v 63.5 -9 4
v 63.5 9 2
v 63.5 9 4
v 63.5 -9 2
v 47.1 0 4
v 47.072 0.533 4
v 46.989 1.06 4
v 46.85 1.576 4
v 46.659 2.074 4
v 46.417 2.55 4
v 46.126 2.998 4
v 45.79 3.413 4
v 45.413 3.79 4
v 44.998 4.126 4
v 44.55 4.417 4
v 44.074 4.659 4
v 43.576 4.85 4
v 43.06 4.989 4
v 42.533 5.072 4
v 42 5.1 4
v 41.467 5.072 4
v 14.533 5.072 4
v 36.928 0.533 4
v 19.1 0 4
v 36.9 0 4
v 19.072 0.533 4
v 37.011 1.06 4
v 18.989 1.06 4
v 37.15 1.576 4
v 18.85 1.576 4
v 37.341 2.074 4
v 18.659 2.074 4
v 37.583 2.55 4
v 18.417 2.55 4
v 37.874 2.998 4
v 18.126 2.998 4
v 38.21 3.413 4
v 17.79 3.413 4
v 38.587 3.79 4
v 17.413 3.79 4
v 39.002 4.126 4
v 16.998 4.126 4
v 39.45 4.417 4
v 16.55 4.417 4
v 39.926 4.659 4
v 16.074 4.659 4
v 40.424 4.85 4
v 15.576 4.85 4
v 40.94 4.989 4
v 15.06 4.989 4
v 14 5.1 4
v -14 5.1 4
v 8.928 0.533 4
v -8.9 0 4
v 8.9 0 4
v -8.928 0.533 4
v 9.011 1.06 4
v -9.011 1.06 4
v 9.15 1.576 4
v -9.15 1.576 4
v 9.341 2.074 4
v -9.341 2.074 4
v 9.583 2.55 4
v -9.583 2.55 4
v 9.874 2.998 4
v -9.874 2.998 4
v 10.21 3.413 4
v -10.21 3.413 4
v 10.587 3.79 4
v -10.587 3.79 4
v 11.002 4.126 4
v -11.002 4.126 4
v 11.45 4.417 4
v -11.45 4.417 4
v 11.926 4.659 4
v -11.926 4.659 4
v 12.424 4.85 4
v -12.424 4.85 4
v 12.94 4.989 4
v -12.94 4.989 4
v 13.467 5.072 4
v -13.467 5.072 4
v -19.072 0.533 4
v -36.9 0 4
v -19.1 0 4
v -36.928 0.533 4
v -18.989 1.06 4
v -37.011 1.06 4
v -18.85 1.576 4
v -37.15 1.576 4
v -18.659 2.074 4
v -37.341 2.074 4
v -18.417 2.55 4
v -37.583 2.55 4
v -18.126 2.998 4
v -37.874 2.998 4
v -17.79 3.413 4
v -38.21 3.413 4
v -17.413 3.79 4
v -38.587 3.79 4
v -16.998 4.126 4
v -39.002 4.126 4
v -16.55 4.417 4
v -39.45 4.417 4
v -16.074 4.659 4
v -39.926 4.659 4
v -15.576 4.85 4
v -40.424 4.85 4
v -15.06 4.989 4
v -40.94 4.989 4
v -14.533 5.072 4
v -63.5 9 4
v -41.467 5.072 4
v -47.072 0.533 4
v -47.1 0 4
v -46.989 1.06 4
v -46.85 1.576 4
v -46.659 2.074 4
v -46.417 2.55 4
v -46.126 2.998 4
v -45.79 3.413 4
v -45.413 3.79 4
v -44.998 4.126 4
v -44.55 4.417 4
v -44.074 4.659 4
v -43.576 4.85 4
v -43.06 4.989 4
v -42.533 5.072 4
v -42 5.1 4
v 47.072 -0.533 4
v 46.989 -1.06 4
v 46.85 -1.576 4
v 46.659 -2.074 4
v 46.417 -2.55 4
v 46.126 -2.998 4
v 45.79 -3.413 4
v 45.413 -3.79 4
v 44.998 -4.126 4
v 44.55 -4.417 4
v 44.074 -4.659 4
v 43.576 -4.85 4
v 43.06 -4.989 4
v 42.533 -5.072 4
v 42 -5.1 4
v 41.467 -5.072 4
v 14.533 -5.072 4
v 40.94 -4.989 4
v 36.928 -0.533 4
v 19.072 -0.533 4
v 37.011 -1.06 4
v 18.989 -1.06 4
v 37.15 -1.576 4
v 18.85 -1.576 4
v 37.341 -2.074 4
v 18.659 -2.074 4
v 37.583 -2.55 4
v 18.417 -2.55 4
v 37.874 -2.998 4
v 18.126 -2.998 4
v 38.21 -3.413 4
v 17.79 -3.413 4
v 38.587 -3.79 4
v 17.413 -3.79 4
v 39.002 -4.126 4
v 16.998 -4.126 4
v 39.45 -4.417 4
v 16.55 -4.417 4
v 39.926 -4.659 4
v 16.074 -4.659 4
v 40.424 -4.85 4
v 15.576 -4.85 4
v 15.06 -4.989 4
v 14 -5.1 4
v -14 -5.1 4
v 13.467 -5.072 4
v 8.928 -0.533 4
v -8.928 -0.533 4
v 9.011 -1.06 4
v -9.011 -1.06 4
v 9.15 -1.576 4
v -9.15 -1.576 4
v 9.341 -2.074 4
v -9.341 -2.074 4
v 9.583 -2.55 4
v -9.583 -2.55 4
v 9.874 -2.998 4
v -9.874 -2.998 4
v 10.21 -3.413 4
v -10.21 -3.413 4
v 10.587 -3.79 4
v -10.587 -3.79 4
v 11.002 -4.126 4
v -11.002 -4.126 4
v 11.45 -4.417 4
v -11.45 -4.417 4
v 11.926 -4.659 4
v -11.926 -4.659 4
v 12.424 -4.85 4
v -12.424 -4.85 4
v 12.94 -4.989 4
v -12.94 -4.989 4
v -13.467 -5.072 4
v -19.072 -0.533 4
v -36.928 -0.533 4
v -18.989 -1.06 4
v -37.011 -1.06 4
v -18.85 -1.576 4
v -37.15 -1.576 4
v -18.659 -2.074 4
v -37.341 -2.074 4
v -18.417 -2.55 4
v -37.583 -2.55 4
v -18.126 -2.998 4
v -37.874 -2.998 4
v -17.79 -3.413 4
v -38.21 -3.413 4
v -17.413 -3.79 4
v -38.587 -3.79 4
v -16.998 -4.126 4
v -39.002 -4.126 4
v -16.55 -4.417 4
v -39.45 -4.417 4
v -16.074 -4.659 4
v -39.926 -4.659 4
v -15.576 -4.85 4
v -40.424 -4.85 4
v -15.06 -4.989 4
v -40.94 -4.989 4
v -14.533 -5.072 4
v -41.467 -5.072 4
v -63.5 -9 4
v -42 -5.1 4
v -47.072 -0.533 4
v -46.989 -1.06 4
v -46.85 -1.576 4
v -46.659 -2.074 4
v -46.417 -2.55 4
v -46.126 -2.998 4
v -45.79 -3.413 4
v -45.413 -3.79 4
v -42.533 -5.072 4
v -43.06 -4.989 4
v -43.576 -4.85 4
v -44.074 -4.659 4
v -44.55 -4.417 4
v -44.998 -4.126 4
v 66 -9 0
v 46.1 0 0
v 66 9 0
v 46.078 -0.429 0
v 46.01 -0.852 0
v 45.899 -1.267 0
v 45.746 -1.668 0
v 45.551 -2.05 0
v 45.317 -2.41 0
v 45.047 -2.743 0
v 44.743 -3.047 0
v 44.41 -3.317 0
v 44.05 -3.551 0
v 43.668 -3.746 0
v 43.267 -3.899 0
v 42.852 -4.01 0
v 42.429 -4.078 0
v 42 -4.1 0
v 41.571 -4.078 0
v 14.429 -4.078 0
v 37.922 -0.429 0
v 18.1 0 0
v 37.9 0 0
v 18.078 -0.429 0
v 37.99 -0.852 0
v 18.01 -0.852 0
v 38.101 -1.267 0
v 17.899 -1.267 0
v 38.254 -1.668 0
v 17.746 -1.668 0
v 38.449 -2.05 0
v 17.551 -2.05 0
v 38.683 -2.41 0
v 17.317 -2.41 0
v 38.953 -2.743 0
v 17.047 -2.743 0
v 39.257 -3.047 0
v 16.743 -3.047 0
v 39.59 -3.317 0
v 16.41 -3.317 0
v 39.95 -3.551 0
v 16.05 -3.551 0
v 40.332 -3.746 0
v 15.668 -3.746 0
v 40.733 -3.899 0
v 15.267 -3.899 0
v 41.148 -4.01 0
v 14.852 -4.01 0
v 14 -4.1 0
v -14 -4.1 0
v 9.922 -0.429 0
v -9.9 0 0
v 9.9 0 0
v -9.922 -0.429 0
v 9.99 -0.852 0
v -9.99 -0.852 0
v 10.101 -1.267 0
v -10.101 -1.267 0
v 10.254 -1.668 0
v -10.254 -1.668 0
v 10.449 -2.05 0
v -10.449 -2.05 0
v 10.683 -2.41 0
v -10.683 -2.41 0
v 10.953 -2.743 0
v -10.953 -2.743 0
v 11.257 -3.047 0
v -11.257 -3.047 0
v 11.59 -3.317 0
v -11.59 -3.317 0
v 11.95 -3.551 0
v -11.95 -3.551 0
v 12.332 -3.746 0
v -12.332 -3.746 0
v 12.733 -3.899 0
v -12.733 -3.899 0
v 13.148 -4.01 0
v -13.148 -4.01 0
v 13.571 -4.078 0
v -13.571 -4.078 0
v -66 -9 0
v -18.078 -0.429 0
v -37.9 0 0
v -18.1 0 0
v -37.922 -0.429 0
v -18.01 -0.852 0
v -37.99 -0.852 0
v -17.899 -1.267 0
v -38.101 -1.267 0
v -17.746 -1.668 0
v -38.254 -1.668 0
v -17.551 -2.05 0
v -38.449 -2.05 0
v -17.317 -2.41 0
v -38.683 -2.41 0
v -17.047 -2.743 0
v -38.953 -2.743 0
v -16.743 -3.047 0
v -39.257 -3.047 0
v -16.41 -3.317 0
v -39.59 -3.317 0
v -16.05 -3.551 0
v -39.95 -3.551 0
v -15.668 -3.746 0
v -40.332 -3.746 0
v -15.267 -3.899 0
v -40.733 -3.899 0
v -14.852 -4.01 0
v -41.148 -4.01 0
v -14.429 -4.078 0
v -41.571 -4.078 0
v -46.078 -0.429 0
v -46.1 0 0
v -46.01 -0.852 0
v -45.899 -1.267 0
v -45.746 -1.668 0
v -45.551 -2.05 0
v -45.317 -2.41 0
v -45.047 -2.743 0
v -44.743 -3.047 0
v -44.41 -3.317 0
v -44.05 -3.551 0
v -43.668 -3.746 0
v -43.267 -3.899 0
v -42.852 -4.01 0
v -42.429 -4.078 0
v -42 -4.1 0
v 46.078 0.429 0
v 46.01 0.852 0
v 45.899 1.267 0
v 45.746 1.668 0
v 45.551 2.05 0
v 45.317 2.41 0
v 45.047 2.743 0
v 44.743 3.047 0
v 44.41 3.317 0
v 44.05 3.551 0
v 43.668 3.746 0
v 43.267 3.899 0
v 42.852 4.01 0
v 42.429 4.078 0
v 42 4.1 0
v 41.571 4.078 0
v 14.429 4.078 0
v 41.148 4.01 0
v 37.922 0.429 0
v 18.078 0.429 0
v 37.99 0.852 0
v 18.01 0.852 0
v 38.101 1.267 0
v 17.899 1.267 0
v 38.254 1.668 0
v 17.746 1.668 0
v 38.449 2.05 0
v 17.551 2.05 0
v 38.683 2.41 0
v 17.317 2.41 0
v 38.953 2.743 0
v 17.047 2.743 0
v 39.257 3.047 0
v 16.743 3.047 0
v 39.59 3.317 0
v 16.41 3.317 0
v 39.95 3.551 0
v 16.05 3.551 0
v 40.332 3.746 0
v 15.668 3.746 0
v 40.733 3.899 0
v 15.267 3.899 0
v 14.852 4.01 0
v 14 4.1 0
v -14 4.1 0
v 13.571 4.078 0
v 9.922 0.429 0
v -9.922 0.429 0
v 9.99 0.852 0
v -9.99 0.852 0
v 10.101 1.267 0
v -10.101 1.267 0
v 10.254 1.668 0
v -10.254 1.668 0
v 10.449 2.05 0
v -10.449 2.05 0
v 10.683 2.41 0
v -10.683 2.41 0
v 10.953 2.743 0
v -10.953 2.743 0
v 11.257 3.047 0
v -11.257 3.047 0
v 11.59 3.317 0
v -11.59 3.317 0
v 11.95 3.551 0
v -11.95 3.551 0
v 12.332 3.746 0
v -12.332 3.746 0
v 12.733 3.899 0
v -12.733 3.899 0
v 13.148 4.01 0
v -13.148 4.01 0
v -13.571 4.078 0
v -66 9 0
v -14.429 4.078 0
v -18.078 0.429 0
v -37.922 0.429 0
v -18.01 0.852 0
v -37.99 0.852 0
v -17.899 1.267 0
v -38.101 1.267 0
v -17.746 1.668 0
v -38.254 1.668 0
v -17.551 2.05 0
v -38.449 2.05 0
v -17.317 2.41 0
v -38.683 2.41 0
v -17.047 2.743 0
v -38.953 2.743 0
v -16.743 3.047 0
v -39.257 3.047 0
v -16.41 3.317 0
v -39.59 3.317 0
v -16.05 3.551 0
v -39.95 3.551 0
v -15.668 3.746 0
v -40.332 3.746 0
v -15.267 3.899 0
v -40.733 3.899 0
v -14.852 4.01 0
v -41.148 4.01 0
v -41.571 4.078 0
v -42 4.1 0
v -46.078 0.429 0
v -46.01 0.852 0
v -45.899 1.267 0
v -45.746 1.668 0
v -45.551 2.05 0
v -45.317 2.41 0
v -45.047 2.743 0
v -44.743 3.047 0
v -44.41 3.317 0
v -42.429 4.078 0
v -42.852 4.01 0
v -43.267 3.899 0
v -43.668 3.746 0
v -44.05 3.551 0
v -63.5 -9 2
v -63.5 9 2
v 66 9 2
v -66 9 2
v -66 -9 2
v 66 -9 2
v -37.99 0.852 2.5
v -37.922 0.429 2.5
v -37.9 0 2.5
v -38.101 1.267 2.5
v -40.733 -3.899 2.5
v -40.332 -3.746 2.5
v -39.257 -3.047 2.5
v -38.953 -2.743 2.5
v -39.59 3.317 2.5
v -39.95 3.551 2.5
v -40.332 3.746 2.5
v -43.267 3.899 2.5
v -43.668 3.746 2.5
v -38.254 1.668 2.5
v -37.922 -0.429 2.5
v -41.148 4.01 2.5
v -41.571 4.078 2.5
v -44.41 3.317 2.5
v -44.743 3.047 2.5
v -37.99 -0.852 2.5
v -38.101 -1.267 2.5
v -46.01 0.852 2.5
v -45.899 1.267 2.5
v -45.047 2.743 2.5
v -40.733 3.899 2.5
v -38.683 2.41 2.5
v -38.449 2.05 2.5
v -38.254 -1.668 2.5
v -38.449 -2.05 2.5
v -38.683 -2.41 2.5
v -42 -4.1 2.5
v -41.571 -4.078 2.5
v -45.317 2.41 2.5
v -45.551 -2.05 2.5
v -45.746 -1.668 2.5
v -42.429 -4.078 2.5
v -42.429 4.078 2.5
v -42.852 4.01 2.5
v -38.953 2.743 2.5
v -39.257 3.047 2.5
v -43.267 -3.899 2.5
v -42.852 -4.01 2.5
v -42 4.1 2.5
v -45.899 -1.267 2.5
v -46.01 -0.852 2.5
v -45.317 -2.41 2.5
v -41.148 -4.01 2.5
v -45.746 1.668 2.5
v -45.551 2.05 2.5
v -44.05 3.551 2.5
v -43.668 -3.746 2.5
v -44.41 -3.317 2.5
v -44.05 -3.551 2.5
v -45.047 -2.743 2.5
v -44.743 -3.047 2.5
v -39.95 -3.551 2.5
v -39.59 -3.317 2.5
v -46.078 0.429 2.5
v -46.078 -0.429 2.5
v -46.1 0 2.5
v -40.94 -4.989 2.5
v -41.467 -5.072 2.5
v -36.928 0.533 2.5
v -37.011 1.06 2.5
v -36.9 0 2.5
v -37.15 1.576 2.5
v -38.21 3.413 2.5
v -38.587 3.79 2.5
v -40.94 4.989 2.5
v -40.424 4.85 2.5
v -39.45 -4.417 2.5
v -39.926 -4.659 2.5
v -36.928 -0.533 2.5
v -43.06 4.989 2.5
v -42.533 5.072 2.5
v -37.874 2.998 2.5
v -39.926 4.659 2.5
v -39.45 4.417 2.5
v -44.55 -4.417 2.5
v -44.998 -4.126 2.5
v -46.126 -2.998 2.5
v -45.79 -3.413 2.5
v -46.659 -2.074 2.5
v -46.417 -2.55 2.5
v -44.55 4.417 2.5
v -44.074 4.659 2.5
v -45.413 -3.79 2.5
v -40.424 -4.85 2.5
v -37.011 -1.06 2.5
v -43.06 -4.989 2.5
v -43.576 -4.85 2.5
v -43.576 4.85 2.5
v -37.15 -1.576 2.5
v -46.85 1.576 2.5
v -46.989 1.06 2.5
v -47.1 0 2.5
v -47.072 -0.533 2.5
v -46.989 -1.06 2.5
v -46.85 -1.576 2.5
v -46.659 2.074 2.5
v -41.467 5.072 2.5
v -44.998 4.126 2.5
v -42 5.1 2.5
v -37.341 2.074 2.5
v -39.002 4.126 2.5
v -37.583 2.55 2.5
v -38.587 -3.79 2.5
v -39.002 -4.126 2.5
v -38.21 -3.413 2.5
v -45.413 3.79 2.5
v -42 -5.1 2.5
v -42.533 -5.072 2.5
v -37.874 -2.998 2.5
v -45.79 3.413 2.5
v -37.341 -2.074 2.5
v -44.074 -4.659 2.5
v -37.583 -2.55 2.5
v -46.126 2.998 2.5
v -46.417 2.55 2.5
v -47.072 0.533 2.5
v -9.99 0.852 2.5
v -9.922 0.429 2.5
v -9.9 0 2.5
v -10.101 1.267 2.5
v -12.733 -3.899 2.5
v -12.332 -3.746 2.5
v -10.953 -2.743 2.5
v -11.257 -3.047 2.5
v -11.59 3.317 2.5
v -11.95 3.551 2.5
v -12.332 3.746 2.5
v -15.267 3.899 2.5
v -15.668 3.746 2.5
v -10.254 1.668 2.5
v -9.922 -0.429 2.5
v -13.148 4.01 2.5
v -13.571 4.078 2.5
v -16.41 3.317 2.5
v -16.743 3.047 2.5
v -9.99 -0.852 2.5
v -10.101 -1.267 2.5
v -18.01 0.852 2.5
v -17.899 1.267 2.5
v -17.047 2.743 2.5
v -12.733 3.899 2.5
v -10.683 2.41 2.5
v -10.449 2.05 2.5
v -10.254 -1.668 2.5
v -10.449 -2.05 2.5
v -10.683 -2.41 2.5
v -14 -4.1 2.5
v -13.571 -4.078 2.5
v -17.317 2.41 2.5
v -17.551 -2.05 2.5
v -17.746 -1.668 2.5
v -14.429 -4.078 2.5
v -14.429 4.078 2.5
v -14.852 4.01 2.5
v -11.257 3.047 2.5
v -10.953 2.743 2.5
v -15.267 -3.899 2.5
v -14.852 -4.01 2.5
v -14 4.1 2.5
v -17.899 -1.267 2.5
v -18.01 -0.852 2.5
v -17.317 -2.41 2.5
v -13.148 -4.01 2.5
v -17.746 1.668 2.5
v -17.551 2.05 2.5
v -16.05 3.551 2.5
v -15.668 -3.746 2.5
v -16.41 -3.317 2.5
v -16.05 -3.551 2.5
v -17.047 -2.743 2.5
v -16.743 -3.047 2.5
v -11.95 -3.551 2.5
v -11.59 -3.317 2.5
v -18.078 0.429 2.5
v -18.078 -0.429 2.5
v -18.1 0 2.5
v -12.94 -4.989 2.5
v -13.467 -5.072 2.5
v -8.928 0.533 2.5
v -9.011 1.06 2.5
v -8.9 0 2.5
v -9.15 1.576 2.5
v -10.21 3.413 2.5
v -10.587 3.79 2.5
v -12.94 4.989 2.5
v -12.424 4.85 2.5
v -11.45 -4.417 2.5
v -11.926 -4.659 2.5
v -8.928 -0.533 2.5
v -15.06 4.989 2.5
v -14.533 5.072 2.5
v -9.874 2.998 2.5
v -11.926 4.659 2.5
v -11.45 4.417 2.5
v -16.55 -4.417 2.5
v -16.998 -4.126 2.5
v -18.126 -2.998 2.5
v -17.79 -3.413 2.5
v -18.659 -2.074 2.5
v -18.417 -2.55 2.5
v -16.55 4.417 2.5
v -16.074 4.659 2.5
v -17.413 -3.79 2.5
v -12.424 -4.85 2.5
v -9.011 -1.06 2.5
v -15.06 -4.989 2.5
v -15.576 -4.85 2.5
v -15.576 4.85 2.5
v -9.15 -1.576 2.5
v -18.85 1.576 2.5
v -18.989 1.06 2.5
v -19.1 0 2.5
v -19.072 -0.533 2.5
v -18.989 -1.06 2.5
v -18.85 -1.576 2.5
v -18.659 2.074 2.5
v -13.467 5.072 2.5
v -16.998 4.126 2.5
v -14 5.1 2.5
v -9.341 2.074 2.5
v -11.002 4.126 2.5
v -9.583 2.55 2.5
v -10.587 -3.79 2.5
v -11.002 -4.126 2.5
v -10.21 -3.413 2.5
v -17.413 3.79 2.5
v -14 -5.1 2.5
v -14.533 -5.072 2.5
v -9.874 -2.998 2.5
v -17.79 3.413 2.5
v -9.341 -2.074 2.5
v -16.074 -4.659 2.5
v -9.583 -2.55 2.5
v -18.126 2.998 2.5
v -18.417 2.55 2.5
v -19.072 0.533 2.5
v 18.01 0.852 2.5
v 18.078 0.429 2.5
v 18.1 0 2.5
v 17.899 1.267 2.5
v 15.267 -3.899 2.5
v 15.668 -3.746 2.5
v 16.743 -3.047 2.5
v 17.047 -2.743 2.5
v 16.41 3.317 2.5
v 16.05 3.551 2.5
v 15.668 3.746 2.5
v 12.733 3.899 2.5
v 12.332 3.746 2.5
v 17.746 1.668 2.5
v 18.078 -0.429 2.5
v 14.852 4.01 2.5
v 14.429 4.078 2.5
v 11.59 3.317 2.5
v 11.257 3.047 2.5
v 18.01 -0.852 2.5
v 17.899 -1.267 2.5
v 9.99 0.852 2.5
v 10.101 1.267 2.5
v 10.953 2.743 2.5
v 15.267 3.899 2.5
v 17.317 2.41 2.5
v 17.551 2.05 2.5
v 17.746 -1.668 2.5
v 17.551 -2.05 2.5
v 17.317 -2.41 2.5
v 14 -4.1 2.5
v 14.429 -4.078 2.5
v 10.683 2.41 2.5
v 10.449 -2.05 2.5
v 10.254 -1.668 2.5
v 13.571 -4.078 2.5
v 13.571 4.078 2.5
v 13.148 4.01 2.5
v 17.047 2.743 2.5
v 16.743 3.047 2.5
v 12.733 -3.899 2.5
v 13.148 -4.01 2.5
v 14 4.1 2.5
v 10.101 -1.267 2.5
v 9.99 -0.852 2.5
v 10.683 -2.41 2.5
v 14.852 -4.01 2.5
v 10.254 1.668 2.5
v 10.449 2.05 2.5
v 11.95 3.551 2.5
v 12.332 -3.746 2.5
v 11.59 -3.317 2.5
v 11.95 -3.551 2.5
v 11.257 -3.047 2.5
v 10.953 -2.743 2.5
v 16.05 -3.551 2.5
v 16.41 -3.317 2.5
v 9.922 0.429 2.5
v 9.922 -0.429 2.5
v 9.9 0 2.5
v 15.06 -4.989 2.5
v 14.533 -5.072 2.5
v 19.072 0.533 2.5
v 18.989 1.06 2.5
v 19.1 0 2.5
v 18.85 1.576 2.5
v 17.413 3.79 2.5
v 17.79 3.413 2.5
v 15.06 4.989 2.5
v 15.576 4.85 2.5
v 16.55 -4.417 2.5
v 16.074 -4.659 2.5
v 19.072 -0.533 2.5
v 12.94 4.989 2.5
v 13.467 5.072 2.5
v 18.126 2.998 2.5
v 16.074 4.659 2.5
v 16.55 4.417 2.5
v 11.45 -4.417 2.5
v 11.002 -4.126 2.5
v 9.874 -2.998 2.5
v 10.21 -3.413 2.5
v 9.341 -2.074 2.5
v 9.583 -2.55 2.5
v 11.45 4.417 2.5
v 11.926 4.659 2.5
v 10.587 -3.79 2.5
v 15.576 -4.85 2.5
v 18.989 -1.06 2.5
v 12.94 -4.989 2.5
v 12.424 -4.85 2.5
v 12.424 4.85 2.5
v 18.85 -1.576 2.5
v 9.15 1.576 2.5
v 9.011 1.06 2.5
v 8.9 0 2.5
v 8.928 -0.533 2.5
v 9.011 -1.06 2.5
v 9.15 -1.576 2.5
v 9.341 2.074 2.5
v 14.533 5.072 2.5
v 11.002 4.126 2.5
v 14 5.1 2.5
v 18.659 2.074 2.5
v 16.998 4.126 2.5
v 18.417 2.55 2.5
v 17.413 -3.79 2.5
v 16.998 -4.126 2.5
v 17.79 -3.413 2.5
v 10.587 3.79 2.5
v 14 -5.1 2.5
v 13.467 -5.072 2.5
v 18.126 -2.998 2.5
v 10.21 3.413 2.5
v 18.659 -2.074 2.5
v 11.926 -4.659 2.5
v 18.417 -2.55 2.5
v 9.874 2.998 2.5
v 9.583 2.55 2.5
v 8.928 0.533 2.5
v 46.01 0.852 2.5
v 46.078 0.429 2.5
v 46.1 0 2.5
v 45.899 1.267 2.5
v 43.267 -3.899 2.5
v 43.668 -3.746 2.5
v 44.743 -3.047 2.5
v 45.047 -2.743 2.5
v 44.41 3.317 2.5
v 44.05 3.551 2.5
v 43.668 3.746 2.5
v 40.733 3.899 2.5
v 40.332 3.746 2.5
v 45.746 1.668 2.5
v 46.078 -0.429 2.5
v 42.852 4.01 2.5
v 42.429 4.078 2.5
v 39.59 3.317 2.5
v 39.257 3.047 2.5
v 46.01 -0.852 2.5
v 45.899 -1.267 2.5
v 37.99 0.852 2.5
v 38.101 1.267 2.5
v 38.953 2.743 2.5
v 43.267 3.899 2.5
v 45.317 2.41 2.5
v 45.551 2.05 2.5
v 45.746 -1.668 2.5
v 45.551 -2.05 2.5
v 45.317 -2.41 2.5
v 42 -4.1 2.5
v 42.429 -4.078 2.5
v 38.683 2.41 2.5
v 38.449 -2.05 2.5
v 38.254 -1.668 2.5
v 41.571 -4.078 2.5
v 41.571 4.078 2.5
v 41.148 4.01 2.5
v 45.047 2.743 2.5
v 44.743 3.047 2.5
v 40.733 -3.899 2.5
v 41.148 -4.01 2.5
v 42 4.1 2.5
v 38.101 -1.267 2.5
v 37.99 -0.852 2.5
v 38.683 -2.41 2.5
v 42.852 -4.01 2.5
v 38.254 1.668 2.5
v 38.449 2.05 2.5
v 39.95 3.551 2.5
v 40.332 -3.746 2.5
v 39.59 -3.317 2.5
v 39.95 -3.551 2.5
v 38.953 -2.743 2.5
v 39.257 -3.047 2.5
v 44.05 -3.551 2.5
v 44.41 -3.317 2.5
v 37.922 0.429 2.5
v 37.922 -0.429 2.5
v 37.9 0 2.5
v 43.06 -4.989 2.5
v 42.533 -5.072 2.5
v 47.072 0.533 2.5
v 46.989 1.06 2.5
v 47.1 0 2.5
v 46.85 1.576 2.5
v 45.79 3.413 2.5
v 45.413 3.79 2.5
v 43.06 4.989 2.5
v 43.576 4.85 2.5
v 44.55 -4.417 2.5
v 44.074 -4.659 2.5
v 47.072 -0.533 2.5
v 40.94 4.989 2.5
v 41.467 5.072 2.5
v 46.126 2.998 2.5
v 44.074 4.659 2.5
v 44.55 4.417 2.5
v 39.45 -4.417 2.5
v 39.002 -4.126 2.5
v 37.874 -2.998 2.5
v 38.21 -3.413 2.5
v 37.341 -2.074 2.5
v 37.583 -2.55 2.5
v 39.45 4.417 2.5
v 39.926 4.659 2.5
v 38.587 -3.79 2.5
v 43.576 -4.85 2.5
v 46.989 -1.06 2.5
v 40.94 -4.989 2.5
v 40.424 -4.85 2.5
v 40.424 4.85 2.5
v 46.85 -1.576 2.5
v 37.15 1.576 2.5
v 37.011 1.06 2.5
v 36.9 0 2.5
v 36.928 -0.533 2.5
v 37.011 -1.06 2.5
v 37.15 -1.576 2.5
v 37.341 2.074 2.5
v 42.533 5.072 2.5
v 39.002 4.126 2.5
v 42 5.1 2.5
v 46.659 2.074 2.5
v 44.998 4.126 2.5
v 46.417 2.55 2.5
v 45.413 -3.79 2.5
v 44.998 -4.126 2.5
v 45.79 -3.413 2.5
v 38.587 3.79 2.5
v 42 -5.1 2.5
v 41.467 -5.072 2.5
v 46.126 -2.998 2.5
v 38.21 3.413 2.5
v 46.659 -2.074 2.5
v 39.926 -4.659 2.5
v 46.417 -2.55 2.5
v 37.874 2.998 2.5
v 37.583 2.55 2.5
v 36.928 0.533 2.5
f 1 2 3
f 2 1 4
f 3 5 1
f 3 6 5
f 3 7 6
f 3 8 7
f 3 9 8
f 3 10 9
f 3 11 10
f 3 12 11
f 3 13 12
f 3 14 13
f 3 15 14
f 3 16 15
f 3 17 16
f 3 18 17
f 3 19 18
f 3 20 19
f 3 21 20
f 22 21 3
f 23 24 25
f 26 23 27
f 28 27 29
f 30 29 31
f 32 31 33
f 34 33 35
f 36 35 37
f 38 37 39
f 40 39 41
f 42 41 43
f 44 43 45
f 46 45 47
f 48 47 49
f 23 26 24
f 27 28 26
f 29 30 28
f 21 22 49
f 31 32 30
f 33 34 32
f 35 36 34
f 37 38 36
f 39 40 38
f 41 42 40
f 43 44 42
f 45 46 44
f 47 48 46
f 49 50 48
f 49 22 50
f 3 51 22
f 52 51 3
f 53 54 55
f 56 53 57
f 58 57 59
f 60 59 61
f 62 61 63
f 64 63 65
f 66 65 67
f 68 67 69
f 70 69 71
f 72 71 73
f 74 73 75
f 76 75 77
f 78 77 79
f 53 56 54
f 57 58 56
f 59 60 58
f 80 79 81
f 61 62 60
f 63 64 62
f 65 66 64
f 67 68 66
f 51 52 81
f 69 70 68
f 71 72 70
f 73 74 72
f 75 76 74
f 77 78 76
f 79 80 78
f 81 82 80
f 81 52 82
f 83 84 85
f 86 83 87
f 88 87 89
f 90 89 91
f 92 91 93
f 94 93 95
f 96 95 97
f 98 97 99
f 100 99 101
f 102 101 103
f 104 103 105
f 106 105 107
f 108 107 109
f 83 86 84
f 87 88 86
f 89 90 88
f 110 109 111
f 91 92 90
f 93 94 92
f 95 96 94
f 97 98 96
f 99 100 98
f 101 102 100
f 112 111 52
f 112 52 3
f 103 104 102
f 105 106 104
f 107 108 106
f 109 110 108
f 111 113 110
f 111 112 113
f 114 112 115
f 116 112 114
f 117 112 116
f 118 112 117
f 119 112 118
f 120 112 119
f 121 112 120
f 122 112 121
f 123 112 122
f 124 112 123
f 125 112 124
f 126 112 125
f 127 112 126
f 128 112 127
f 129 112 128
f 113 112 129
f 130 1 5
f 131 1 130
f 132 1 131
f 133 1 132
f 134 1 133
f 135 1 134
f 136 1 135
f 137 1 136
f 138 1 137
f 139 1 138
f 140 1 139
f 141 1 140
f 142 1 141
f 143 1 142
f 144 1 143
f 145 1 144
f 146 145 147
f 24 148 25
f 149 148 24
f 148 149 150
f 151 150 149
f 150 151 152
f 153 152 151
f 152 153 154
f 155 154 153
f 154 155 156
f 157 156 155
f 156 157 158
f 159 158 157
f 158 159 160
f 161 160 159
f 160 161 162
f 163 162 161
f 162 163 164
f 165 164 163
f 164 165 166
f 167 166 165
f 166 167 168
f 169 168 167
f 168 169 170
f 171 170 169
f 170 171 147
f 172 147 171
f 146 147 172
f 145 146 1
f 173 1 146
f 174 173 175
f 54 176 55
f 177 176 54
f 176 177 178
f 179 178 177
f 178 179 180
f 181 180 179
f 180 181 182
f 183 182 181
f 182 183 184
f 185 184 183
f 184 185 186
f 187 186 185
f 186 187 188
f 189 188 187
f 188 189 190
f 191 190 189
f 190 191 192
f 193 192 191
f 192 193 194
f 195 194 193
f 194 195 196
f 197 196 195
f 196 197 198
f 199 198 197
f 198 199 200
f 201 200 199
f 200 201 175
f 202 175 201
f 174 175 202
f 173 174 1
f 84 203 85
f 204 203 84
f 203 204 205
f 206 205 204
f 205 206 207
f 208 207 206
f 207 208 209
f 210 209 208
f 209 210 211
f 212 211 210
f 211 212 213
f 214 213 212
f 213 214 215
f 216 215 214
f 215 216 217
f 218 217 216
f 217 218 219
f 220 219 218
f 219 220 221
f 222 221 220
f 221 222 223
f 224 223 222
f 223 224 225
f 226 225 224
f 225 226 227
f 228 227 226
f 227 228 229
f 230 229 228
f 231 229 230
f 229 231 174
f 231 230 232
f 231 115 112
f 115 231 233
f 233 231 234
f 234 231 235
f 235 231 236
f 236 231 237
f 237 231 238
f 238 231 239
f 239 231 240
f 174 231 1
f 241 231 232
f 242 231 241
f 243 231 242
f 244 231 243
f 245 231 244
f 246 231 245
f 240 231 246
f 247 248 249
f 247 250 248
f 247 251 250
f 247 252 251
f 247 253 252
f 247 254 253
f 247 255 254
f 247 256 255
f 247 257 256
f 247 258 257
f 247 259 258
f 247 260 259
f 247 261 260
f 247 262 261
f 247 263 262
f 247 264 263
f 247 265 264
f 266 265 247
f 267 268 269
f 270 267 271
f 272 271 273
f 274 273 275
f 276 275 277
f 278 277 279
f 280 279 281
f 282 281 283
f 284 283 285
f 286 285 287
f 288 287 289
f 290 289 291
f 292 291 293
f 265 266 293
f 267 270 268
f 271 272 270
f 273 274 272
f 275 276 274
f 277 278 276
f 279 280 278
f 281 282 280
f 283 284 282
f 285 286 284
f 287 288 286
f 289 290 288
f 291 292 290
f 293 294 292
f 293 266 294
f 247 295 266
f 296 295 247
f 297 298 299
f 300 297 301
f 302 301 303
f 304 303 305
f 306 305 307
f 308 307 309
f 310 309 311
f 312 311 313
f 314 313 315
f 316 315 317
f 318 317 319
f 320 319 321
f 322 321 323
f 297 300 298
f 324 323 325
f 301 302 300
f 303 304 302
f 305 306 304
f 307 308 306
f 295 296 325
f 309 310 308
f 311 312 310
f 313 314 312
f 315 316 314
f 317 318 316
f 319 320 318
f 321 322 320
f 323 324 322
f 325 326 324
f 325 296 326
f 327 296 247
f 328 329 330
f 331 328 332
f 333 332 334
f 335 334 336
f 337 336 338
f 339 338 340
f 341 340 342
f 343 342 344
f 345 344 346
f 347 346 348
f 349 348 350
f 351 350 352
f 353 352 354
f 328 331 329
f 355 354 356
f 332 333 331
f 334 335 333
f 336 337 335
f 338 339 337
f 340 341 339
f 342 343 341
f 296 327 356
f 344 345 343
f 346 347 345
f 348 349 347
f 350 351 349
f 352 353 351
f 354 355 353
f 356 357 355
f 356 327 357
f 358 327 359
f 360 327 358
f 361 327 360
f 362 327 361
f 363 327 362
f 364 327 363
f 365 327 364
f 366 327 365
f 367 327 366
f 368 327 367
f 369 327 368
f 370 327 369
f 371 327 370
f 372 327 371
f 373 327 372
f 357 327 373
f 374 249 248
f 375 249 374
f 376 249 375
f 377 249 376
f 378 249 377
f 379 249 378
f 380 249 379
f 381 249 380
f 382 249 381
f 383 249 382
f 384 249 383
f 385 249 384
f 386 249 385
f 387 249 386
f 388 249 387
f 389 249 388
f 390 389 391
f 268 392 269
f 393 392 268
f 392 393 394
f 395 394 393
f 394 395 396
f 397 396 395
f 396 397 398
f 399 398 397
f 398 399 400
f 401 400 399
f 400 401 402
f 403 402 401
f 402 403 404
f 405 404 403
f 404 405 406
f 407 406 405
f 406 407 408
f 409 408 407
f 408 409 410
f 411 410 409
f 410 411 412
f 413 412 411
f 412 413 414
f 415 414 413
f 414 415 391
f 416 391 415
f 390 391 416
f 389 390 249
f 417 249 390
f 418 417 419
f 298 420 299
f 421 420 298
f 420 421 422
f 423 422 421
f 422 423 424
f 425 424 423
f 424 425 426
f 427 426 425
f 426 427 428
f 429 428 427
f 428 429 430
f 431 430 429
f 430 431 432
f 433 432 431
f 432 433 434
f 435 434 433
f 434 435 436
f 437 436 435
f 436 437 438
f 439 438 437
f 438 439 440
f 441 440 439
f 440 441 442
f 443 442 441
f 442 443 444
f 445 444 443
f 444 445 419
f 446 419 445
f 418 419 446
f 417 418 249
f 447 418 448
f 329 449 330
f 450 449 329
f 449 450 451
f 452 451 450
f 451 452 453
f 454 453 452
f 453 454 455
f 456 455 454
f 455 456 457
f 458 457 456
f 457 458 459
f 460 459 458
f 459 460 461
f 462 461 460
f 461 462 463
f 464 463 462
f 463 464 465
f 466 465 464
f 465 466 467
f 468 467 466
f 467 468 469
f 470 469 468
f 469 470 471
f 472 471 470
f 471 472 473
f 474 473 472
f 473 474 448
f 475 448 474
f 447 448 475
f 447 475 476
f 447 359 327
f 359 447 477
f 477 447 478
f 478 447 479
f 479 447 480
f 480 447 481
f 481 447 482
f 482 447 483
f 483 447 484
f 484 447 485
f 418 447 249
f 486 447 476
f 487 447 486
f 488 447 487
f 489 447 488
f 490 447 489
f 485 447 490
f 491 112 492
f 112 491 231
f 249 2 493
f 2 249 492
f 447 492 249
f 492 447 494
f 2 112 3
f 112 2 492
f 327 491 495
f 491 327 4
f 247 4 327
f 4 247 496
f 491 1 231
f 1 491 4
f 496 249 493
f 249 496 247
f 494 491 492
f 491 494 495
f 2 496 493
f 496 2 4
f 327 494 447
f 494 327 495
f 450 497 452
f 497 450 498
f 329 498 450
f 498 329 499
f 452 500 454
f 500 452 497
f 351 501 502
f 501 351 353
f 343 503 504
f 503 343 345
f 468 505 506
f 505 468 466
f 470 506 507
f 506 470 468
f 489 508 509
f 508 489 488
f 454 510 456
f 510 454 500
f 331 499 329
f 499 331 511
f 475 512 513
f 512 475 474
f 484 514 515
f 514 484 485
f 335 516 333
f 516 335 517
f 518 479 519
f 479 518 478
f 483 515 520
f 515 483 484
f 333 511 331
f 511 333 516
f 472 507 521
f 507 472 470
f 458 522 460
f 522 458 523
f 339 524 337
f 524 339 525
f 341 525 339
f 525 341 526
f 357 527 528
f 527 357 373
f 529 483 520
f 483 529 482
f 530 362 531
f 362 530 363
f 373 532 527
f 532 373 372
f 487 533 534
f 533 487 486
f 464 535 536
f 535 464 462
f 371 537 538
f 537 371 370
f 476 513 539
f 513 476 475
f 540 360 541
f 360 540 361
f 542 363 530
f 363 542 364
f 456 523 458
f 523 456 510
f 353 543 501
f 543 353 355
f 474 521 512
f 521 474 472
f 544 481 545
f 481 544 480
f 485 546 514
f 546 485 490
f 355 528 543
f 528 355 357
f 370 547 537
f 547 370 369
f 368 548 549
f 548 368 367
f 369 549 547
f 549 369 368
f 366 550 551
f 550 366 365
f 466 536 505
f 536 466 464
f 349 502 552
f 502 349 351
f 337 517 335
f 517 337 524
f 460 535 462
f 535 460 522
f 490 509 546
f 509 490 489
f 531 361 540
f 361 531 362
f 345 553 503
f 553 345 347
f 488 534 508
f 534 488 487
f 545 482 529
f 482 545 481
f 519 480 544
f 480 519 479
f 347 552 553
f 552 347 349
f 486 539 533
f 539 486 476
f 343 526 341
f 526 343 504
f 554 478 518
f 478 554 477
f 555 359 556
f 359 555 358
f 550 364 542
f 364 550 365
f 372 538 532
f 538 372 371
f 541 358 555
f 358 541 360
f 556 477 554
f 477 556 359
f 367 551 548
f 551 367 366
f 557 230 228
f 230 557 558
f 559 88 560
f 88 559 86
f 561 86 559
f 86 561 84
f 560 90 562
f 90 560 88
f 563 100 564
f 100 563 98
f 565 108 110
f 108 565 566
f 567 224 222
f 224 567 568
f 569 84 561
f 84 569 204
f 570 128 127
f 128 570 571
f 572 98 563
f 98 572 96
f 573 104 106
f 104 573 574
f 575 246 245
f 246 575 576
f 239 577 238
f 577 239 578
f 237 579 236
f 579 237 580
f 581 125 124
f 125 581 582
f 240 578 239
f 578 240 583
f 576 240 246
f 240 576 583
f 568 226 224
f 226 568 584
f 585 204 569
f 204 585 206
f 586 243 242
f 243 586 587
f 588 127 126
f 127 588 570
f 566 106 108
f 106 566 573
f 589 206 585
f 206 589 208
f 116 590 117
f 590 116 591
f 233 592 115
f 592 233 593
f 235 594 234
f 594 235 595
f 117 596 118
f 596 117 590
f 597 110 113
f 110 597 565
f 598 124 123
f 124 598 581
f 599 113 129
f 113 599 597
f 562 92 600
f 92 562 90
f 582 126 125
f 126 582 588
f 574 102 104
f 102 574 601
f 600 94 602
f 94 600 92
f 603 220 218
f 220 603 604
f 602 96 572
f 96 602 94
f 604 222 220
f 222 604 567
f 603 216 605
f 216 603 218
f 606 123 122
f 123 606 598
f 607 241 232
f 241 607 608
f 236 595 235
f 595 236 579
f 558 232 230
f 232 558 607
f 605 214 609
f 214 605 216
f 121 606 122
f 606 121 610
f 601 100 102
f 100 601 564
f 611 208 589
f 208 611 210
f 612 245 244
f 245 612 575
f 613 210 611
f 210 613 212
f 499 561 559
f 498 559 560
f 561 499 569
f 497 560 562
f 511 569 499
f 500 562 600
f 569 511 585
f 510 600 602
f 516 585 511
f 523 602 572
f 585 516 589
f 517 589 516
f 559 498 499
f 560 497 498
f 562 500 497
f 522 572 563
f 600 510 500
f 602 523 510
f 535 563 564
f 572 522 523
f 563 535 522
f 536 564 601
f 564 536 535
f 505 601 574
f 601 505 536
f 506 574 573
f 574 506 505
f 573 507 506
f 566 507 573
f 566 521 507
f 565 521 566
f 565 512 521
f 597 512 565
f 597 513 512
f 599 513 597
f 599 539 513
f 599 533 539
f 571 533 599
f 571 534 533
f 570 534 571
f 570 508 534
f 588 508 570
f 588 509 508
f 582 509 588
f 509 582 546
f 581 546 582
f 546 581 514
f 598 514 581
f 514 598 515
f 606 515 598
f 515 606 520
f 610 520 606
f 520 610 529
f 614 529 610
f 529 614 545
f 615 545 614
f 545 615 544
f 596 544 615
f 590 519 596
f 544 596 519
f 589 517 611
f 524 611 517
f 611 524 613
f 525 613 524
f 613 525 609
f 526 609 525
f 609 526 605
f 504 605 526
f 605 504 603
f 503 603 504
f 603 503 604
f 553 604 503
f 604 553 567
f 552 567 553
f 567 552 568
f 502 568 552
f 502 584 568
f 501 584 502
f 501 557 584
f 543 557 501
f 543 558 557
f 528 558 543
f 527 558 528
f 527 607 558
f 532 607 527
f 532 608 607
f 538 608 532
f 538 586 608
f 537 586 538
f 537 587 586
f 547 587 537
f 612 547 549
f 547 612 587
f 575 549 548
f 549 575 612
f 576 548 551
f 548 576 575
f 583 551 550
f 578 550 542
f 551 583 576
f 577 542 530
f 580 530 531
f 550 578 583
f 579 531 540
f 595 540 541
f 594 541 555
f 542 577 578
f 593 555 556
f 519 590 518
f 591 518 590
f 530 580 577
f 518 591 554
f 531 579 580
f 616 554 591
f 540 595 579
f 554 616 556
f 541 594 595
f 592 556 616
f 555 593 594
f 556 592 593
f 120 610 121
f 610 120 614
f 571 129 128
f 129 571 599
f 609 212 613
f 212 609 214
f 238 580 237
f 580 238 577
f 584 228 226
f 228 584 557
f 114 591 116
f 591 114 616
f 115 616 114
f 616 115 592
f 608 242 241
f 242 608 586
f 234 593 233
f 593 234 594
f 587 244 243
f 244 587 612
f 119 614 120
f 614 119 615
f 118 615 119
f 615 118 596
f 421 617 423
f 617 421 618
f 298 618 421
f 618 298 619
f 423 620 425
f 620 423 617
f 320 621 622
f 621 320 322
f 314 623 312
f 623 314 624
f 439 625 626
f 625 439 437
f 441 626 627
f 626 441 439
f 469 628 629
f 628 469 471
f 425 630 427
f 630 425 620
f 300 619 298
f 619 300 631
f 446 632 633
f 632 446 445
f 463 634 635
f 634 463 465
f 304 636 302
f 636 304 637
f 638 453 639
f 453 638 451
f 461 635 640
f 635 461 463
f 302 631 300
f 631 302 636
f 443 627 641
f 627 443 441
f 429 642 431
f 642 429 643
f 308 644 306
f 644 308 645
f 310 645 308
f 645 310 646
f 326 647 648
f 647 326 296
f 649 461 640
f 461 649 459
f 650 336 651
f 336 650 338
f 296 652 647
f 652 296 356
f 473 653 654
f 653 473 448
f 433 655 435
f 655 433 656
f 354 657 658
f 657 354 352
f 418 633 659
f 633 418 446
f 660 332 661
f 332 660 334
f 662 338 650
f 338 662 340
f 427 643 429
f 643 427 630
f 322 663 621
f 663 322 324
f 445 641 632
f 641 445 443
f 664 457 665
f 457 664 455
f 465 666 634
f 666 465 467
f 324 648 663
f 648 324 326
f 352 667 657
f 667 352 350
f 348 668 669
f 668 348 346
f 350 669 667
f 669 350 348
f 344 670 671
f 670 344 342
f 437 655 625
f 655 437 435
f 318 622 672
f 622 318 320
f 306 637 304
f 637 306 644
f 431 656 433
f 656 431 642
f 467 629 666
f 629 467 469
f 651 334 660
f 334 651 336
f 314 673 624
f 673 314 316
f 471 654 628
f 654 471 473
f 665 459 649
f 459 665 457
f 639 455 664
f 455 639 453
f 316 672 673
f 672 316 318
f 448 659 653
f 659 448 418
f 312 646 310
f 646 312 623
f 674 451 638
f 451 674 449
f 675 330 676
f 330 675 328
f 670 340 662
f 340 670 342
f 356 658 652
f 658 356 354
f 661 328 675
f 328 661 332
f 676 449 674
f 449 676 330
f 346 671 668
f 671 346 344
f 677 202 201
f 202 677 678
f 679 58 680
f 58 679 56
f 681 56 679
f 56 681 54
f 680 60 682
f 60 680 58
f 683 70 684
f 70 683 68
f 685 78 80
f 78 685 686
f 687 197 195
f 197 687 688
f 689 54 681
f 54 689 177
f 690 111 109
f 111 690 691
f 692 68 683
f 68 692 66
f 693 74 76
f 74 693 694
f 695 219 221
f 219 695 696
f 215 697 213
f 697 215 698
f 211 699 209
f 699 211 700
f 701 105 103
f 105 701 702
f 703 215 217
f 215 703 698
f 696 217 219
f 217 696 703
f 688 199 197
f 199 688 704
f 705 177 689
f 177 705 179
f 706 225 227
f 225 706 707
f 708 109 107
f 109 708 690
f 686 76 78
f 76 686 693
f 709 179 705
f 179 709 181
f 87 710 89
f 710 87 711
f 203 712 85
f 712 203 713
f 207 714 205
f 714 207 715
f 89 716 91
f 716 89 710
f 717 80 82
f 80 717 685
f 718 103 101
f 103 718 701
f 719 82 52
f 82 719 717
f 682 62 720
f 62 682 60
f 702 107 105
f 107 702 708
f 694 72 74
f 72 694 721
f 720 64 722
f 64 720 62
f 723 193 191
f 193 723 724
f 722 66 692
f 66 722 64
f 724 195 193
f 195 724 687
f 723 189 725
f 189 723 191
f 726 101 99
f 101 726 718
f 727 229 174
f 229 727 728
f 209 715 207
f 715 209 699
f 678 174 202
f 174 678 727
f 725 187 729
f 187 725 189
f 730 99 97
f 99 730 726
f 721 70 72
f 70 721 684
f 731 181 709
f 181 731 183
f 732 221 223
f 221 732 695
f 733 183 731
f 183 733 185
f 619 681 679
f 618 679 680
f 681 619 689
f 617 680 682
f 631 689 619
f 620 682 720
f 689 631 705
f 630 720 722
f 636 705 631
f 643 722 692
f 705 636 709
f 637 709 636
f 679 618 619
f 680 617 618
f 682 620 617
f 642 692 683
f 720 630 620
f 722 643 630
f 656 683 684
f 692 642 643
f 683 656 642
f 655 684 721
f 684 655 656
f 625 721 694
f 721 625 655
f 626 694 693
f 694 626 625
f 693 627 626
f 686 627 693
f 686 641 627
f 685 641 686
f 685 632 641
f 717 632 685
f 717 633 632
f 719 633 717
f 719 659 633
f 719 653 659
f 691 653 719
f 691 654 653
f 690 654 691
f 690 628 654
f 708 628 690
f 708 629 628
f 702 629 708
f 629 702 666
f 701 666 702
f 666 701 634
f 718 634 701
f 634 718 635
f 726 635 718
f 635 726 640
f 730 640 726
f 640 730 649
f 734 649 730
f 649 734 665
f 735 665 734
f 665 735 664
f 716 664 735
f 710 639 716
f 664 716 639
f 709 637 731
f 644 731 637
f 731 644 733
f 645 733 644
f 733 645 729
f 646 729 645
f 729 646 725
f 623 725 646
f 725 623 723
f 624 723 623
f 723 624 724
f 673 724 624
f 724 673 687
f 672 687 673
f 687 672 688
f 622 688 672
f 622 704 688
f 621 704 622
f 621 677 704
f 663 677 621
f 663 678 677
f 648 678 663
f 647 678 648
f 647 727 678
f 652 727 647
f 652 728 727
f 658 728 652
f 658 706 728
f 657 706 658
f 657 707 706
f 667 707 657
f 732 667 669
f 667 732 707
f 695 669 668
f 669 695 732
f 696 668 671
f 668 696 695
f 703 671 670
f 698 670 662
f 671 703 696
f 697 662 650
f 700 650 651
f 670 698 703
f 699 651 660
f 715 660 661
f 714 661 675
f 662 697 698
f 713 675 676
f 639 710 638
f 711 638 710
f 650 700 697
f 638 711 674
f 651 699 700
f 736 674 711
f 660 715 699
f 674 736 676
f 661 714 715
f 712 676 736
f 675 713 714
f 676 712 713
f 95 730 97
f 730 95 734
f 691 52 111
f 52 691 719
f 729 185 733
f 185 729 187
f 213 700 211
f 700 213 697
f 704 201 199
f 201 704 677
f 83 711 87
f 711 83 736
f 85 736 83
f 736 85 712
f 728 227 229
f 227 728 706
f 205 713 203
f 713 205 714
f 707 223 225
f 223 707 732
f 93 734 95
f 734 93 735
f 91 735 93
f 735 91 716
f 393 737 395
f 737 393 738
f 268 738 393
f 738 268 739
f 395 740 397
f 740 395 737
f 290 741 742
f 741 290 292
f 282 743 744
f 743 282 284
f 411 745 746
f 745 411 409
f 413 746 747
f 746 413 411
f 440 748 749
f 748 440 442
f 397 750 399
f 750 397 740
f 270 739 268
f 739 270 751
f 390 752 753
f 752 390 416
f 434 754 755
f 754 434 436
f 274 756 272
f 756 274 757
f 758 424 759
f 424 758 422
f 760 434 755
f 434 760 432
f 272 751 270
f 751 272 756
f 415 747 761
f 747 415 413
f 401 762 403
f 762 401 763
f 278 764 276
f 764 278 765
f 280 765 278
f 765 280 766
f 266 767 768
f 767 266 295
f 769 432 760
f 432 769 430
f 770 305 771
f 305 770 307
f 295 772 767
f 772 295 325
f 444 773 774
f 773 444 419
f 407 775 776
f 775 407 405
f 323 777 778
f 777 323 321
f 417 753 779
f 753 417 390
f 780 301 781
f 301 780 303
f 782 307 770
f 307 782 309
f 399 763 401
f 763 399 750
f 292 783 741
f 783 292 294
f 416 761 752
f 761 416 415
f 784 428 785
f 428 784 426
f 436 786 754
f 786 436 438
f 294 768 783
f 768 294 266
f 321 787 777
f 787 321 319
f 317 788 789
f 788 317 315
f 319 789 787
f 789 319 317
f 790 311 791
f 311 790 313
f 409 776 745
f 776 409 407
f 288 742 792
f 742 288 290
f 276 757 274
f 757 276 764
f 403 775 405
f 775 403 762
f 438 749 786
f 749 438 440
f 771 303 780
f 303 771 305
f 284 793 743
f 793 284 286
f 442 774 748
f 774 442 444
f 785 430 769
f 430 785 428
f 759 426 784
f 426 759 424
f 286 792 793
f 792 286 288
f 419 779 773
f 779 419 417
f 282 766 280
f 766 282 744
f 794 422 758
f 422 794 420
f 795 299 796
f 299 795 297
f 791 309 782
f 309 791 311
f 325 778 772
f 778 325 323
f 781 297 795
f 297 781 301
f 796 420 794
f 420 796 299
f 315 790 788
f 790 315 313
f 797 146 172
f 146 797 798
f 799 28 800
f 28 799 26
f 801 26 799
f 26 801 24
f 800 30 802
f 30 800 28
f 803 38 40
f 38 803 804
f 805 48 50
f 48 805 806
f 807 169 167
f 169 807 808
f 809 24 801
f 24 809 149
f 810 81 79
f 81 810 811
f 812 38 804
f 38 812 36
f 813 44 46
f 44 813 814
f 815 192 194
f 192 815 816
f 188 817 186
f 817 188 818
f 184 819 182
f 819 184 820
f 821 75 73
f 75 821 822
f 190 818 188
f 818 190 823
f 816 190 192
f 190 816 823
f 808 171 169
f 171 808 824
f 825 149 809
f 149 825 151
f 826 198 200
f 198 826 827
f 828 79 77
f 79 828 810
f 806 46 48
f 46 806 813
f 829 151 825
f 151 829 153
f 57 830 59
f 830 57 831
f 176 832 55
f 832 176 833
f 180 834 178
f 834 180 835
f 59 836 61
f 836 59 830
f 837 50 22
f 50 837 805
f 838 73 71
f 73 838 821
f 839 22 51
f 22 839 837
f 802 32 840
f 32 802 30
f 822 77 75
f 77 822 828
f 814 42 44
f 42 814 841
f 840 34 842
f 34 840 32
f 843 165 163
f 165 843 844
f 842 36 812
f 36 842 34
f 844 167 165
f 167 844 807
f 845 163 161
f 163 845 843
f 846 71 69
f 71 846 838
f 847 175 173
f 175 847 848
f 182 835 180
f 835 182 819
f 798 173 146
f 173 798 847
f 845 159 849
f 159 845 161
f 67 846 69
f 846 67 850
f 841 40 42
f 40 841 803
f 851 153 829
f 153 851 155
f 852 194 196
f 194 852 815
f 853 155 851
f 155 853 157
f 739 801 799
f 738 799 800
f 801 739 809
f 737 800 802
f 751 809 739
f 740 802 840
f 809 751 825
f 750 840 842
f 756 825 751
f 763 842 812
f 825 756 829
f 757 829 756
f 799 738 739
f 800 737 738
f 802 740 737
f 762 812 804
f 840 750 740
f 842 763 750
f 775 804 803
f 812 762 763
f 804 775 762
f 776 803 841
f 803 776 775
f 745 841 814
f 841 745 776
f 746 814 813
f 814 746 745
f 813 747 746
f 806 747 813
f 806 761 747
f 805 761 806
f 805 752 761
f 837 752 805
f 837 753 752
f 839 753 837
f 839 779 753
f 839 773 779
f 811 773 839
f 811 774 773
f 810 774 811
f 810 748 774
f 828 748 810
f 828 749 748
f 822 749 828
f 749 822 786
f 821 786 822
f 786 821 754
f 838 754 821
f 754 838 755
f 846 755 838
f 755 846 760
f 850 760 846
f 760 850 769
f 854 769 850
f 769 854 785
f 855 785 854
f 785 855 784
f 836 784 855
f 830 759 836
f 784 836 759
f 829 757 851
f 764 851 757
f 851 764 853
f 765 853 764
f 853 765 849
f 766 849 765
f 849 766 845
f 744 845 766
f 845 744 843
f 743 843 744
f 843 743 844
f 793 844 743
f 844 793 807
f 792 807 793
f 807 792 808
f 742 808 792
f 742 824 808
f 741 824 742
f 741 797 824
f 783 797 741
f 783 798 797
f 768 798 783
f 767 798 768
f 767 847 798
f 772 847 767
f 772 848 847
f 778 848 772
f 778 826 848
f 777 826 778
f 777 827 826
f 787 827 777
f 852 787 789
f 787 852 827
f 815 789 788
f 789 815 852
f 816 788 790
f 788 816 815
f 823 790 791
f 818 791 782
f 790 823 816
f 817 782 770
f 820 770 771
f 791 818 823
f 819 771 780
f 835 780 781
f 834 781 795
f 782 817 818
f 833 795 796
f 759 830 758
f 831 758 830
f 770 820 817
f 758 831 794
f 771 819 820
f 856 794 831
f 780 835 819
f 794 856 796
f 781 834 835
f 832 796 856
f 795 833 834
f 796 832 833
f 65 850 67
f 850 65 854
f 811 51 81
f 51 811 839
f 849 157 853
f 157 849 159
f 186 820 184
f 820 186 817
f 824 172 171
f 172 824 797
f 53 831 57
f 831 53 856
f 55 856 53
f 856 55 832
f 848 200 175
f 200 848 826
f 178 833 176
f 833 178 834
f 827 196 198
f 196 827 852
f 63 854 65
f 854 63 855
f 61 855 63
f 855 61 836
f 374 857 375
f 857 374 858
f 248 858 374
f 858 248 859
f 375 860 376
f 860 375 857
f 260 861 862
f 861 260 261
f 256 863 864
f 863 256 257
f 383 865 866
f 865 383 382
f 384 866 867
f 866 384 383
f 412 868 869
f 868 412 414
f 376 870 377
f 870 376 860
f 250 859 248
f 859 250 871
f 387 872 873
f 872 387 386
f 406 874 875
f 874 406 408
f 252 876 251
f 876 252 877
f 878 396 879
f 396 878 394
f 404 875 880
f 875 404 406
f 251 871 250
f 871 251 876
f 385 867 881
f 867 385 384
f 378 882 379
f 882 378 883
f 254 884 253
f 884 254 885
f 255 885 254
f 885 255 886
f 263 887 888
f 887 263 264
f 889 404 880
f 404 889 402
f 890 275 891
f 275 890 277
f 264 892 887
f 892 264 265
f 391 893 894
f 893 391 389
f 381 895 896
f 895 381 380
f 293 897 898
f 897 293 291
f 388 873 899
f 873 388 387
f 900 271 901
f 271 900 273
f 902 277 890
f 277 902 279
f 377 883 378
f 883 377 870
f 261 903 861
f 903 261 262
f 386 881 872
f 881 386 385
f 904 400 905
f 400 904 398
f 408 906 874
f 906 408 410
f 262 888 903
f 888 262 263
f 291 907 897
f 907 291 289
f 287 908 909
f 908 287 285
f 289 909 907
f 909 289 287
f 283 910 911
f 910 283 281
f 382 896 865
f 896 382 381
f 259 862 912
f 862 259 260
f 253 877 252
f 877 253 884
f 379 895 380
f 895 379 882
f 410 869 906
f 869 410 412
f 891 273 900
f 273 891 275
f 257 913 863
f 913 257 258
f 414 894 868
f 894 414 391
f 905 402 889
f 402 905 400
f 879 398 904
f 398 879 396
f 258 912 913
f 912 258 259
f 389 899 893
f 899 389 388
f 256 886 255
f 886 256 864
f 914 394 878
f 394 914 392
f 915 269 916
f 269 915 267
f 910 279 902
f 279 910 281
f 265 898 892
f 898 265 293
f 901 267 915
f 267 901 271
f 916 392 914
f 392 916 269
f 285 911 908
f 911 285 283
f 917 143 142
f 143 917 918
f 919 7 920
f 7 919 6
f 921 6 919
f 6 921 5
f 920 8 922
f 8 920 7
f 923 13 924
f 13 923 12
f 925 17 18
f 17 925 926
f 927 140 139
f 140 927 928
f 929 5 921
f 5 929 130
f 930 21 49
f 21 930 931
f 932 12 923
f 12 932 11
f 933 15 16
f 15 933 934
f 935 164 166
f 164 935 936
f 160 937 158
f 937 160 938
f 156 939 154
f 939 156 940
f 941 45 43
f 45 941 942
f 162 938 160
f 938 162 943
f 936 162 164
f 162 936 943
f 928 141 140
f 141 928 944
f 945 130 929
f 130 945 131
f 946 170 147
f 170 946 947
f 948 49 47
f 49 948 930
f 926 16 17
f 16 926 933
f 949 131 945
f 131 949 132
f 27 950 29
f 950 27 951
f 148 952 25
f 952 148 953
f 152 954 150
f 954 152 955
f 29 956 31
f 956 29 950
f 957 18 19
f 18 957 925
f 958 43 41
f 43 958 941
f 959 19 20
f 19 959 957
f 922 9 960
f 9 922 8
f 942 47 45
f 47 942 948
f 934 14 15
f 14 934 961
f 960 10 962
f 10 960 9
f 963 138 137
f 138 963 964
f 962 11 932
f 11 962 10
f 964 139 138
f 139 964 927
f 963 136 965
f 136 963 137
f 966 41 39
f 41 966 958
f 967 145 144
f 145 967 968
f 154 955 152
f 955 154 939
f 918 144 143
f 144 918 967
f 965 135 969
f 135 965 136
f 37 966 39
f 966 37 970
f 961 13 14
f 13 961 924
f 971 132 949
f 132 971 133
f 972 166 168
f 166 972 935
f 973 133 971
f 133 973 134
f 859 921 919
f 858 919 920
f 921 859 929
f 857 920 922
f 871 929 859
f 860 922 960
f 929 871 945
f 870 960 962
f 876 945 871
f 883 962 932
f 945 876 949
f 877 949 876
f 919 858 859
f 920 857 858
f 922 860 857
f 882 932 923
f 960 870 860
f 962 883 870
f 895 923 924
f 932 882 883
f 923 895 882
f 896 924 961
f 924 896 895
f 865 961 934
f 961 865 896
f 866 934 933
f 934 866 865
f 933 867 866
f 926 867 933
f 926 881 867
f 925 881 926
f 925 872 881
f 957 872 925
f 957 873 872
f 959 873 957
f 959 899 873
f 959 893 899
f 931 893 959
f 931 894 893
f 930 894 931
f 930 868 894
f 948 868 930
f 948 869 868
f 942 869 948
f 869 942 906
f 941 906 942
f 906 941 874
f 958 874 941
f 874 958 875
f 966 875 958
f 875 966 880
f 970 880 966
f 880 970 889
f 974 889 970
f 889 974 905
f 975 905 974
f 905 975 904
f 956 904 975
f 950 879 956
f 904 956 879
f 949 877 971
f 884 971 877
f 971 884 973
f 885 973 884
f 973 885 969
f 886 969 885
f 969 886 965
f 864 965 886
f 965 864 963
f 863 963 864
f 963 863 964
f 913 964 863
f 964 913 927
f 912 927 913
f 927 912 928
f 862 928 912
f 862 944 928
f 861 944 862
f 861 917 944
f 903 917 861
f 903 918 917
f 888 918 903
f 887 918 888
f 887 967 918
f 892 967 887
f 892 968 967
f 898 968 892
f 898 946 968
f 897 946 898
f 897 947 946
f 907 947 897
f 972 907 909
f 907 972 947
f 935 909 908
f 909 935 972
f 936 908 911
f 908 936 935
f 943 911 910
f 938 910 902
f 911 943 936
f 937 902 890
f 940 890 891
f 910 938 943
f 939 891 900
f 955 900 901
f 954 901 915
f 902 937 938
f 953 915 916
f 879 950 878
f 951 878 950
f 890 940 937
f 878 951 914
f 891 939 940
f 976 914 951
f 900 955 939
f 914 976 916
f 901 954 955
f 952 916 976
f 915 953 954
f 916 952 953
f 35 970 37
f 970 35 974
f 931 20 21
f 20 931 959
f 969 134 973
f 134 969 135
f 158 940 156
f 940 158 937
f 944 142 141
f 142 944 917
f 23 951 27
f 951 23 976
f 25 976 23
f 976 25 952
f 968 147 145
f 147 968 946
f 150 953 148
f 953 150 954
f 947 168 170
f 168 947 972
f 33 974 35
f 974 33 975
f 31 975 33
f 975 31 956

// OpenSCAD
include <BOSL/constants.scad>
use <BOSL/shapes.scad>
use <BOSL/transforms.scad>
use <BOSL/masks.scad>

$fn=60;

toolWidth=127; //5"
toolDepth=18;
toolHeight=4;

spacing = 14;

trrsDiam=8.2;
trrsLip=10.2;

tool();

module tool() {  
  difference(){
    union() {
      color("orange") cuboid([toolWidth, toolDepth, toolHeight], align=V_UP); //base jig
      color("orange") cuboid([toolWidth+5, toolDepth, 2], align=V_UP); //to fit into vise 
    }
    left(spacing*3) trrs(); 
    left(spacing) trrs();
    right(spacing) trrs(); 
    right(spacing*3) trrs();
    
  }//difference
}

module trrs() {
    color("green") cyl(d=trrsDiam, h=toolHeight, align=V_UP); // TRRS
    up(toolHeight-1.5) color("blue") cyl(d=trrsLip, h=1.5, align=V_UP); // TRRS lip
}
